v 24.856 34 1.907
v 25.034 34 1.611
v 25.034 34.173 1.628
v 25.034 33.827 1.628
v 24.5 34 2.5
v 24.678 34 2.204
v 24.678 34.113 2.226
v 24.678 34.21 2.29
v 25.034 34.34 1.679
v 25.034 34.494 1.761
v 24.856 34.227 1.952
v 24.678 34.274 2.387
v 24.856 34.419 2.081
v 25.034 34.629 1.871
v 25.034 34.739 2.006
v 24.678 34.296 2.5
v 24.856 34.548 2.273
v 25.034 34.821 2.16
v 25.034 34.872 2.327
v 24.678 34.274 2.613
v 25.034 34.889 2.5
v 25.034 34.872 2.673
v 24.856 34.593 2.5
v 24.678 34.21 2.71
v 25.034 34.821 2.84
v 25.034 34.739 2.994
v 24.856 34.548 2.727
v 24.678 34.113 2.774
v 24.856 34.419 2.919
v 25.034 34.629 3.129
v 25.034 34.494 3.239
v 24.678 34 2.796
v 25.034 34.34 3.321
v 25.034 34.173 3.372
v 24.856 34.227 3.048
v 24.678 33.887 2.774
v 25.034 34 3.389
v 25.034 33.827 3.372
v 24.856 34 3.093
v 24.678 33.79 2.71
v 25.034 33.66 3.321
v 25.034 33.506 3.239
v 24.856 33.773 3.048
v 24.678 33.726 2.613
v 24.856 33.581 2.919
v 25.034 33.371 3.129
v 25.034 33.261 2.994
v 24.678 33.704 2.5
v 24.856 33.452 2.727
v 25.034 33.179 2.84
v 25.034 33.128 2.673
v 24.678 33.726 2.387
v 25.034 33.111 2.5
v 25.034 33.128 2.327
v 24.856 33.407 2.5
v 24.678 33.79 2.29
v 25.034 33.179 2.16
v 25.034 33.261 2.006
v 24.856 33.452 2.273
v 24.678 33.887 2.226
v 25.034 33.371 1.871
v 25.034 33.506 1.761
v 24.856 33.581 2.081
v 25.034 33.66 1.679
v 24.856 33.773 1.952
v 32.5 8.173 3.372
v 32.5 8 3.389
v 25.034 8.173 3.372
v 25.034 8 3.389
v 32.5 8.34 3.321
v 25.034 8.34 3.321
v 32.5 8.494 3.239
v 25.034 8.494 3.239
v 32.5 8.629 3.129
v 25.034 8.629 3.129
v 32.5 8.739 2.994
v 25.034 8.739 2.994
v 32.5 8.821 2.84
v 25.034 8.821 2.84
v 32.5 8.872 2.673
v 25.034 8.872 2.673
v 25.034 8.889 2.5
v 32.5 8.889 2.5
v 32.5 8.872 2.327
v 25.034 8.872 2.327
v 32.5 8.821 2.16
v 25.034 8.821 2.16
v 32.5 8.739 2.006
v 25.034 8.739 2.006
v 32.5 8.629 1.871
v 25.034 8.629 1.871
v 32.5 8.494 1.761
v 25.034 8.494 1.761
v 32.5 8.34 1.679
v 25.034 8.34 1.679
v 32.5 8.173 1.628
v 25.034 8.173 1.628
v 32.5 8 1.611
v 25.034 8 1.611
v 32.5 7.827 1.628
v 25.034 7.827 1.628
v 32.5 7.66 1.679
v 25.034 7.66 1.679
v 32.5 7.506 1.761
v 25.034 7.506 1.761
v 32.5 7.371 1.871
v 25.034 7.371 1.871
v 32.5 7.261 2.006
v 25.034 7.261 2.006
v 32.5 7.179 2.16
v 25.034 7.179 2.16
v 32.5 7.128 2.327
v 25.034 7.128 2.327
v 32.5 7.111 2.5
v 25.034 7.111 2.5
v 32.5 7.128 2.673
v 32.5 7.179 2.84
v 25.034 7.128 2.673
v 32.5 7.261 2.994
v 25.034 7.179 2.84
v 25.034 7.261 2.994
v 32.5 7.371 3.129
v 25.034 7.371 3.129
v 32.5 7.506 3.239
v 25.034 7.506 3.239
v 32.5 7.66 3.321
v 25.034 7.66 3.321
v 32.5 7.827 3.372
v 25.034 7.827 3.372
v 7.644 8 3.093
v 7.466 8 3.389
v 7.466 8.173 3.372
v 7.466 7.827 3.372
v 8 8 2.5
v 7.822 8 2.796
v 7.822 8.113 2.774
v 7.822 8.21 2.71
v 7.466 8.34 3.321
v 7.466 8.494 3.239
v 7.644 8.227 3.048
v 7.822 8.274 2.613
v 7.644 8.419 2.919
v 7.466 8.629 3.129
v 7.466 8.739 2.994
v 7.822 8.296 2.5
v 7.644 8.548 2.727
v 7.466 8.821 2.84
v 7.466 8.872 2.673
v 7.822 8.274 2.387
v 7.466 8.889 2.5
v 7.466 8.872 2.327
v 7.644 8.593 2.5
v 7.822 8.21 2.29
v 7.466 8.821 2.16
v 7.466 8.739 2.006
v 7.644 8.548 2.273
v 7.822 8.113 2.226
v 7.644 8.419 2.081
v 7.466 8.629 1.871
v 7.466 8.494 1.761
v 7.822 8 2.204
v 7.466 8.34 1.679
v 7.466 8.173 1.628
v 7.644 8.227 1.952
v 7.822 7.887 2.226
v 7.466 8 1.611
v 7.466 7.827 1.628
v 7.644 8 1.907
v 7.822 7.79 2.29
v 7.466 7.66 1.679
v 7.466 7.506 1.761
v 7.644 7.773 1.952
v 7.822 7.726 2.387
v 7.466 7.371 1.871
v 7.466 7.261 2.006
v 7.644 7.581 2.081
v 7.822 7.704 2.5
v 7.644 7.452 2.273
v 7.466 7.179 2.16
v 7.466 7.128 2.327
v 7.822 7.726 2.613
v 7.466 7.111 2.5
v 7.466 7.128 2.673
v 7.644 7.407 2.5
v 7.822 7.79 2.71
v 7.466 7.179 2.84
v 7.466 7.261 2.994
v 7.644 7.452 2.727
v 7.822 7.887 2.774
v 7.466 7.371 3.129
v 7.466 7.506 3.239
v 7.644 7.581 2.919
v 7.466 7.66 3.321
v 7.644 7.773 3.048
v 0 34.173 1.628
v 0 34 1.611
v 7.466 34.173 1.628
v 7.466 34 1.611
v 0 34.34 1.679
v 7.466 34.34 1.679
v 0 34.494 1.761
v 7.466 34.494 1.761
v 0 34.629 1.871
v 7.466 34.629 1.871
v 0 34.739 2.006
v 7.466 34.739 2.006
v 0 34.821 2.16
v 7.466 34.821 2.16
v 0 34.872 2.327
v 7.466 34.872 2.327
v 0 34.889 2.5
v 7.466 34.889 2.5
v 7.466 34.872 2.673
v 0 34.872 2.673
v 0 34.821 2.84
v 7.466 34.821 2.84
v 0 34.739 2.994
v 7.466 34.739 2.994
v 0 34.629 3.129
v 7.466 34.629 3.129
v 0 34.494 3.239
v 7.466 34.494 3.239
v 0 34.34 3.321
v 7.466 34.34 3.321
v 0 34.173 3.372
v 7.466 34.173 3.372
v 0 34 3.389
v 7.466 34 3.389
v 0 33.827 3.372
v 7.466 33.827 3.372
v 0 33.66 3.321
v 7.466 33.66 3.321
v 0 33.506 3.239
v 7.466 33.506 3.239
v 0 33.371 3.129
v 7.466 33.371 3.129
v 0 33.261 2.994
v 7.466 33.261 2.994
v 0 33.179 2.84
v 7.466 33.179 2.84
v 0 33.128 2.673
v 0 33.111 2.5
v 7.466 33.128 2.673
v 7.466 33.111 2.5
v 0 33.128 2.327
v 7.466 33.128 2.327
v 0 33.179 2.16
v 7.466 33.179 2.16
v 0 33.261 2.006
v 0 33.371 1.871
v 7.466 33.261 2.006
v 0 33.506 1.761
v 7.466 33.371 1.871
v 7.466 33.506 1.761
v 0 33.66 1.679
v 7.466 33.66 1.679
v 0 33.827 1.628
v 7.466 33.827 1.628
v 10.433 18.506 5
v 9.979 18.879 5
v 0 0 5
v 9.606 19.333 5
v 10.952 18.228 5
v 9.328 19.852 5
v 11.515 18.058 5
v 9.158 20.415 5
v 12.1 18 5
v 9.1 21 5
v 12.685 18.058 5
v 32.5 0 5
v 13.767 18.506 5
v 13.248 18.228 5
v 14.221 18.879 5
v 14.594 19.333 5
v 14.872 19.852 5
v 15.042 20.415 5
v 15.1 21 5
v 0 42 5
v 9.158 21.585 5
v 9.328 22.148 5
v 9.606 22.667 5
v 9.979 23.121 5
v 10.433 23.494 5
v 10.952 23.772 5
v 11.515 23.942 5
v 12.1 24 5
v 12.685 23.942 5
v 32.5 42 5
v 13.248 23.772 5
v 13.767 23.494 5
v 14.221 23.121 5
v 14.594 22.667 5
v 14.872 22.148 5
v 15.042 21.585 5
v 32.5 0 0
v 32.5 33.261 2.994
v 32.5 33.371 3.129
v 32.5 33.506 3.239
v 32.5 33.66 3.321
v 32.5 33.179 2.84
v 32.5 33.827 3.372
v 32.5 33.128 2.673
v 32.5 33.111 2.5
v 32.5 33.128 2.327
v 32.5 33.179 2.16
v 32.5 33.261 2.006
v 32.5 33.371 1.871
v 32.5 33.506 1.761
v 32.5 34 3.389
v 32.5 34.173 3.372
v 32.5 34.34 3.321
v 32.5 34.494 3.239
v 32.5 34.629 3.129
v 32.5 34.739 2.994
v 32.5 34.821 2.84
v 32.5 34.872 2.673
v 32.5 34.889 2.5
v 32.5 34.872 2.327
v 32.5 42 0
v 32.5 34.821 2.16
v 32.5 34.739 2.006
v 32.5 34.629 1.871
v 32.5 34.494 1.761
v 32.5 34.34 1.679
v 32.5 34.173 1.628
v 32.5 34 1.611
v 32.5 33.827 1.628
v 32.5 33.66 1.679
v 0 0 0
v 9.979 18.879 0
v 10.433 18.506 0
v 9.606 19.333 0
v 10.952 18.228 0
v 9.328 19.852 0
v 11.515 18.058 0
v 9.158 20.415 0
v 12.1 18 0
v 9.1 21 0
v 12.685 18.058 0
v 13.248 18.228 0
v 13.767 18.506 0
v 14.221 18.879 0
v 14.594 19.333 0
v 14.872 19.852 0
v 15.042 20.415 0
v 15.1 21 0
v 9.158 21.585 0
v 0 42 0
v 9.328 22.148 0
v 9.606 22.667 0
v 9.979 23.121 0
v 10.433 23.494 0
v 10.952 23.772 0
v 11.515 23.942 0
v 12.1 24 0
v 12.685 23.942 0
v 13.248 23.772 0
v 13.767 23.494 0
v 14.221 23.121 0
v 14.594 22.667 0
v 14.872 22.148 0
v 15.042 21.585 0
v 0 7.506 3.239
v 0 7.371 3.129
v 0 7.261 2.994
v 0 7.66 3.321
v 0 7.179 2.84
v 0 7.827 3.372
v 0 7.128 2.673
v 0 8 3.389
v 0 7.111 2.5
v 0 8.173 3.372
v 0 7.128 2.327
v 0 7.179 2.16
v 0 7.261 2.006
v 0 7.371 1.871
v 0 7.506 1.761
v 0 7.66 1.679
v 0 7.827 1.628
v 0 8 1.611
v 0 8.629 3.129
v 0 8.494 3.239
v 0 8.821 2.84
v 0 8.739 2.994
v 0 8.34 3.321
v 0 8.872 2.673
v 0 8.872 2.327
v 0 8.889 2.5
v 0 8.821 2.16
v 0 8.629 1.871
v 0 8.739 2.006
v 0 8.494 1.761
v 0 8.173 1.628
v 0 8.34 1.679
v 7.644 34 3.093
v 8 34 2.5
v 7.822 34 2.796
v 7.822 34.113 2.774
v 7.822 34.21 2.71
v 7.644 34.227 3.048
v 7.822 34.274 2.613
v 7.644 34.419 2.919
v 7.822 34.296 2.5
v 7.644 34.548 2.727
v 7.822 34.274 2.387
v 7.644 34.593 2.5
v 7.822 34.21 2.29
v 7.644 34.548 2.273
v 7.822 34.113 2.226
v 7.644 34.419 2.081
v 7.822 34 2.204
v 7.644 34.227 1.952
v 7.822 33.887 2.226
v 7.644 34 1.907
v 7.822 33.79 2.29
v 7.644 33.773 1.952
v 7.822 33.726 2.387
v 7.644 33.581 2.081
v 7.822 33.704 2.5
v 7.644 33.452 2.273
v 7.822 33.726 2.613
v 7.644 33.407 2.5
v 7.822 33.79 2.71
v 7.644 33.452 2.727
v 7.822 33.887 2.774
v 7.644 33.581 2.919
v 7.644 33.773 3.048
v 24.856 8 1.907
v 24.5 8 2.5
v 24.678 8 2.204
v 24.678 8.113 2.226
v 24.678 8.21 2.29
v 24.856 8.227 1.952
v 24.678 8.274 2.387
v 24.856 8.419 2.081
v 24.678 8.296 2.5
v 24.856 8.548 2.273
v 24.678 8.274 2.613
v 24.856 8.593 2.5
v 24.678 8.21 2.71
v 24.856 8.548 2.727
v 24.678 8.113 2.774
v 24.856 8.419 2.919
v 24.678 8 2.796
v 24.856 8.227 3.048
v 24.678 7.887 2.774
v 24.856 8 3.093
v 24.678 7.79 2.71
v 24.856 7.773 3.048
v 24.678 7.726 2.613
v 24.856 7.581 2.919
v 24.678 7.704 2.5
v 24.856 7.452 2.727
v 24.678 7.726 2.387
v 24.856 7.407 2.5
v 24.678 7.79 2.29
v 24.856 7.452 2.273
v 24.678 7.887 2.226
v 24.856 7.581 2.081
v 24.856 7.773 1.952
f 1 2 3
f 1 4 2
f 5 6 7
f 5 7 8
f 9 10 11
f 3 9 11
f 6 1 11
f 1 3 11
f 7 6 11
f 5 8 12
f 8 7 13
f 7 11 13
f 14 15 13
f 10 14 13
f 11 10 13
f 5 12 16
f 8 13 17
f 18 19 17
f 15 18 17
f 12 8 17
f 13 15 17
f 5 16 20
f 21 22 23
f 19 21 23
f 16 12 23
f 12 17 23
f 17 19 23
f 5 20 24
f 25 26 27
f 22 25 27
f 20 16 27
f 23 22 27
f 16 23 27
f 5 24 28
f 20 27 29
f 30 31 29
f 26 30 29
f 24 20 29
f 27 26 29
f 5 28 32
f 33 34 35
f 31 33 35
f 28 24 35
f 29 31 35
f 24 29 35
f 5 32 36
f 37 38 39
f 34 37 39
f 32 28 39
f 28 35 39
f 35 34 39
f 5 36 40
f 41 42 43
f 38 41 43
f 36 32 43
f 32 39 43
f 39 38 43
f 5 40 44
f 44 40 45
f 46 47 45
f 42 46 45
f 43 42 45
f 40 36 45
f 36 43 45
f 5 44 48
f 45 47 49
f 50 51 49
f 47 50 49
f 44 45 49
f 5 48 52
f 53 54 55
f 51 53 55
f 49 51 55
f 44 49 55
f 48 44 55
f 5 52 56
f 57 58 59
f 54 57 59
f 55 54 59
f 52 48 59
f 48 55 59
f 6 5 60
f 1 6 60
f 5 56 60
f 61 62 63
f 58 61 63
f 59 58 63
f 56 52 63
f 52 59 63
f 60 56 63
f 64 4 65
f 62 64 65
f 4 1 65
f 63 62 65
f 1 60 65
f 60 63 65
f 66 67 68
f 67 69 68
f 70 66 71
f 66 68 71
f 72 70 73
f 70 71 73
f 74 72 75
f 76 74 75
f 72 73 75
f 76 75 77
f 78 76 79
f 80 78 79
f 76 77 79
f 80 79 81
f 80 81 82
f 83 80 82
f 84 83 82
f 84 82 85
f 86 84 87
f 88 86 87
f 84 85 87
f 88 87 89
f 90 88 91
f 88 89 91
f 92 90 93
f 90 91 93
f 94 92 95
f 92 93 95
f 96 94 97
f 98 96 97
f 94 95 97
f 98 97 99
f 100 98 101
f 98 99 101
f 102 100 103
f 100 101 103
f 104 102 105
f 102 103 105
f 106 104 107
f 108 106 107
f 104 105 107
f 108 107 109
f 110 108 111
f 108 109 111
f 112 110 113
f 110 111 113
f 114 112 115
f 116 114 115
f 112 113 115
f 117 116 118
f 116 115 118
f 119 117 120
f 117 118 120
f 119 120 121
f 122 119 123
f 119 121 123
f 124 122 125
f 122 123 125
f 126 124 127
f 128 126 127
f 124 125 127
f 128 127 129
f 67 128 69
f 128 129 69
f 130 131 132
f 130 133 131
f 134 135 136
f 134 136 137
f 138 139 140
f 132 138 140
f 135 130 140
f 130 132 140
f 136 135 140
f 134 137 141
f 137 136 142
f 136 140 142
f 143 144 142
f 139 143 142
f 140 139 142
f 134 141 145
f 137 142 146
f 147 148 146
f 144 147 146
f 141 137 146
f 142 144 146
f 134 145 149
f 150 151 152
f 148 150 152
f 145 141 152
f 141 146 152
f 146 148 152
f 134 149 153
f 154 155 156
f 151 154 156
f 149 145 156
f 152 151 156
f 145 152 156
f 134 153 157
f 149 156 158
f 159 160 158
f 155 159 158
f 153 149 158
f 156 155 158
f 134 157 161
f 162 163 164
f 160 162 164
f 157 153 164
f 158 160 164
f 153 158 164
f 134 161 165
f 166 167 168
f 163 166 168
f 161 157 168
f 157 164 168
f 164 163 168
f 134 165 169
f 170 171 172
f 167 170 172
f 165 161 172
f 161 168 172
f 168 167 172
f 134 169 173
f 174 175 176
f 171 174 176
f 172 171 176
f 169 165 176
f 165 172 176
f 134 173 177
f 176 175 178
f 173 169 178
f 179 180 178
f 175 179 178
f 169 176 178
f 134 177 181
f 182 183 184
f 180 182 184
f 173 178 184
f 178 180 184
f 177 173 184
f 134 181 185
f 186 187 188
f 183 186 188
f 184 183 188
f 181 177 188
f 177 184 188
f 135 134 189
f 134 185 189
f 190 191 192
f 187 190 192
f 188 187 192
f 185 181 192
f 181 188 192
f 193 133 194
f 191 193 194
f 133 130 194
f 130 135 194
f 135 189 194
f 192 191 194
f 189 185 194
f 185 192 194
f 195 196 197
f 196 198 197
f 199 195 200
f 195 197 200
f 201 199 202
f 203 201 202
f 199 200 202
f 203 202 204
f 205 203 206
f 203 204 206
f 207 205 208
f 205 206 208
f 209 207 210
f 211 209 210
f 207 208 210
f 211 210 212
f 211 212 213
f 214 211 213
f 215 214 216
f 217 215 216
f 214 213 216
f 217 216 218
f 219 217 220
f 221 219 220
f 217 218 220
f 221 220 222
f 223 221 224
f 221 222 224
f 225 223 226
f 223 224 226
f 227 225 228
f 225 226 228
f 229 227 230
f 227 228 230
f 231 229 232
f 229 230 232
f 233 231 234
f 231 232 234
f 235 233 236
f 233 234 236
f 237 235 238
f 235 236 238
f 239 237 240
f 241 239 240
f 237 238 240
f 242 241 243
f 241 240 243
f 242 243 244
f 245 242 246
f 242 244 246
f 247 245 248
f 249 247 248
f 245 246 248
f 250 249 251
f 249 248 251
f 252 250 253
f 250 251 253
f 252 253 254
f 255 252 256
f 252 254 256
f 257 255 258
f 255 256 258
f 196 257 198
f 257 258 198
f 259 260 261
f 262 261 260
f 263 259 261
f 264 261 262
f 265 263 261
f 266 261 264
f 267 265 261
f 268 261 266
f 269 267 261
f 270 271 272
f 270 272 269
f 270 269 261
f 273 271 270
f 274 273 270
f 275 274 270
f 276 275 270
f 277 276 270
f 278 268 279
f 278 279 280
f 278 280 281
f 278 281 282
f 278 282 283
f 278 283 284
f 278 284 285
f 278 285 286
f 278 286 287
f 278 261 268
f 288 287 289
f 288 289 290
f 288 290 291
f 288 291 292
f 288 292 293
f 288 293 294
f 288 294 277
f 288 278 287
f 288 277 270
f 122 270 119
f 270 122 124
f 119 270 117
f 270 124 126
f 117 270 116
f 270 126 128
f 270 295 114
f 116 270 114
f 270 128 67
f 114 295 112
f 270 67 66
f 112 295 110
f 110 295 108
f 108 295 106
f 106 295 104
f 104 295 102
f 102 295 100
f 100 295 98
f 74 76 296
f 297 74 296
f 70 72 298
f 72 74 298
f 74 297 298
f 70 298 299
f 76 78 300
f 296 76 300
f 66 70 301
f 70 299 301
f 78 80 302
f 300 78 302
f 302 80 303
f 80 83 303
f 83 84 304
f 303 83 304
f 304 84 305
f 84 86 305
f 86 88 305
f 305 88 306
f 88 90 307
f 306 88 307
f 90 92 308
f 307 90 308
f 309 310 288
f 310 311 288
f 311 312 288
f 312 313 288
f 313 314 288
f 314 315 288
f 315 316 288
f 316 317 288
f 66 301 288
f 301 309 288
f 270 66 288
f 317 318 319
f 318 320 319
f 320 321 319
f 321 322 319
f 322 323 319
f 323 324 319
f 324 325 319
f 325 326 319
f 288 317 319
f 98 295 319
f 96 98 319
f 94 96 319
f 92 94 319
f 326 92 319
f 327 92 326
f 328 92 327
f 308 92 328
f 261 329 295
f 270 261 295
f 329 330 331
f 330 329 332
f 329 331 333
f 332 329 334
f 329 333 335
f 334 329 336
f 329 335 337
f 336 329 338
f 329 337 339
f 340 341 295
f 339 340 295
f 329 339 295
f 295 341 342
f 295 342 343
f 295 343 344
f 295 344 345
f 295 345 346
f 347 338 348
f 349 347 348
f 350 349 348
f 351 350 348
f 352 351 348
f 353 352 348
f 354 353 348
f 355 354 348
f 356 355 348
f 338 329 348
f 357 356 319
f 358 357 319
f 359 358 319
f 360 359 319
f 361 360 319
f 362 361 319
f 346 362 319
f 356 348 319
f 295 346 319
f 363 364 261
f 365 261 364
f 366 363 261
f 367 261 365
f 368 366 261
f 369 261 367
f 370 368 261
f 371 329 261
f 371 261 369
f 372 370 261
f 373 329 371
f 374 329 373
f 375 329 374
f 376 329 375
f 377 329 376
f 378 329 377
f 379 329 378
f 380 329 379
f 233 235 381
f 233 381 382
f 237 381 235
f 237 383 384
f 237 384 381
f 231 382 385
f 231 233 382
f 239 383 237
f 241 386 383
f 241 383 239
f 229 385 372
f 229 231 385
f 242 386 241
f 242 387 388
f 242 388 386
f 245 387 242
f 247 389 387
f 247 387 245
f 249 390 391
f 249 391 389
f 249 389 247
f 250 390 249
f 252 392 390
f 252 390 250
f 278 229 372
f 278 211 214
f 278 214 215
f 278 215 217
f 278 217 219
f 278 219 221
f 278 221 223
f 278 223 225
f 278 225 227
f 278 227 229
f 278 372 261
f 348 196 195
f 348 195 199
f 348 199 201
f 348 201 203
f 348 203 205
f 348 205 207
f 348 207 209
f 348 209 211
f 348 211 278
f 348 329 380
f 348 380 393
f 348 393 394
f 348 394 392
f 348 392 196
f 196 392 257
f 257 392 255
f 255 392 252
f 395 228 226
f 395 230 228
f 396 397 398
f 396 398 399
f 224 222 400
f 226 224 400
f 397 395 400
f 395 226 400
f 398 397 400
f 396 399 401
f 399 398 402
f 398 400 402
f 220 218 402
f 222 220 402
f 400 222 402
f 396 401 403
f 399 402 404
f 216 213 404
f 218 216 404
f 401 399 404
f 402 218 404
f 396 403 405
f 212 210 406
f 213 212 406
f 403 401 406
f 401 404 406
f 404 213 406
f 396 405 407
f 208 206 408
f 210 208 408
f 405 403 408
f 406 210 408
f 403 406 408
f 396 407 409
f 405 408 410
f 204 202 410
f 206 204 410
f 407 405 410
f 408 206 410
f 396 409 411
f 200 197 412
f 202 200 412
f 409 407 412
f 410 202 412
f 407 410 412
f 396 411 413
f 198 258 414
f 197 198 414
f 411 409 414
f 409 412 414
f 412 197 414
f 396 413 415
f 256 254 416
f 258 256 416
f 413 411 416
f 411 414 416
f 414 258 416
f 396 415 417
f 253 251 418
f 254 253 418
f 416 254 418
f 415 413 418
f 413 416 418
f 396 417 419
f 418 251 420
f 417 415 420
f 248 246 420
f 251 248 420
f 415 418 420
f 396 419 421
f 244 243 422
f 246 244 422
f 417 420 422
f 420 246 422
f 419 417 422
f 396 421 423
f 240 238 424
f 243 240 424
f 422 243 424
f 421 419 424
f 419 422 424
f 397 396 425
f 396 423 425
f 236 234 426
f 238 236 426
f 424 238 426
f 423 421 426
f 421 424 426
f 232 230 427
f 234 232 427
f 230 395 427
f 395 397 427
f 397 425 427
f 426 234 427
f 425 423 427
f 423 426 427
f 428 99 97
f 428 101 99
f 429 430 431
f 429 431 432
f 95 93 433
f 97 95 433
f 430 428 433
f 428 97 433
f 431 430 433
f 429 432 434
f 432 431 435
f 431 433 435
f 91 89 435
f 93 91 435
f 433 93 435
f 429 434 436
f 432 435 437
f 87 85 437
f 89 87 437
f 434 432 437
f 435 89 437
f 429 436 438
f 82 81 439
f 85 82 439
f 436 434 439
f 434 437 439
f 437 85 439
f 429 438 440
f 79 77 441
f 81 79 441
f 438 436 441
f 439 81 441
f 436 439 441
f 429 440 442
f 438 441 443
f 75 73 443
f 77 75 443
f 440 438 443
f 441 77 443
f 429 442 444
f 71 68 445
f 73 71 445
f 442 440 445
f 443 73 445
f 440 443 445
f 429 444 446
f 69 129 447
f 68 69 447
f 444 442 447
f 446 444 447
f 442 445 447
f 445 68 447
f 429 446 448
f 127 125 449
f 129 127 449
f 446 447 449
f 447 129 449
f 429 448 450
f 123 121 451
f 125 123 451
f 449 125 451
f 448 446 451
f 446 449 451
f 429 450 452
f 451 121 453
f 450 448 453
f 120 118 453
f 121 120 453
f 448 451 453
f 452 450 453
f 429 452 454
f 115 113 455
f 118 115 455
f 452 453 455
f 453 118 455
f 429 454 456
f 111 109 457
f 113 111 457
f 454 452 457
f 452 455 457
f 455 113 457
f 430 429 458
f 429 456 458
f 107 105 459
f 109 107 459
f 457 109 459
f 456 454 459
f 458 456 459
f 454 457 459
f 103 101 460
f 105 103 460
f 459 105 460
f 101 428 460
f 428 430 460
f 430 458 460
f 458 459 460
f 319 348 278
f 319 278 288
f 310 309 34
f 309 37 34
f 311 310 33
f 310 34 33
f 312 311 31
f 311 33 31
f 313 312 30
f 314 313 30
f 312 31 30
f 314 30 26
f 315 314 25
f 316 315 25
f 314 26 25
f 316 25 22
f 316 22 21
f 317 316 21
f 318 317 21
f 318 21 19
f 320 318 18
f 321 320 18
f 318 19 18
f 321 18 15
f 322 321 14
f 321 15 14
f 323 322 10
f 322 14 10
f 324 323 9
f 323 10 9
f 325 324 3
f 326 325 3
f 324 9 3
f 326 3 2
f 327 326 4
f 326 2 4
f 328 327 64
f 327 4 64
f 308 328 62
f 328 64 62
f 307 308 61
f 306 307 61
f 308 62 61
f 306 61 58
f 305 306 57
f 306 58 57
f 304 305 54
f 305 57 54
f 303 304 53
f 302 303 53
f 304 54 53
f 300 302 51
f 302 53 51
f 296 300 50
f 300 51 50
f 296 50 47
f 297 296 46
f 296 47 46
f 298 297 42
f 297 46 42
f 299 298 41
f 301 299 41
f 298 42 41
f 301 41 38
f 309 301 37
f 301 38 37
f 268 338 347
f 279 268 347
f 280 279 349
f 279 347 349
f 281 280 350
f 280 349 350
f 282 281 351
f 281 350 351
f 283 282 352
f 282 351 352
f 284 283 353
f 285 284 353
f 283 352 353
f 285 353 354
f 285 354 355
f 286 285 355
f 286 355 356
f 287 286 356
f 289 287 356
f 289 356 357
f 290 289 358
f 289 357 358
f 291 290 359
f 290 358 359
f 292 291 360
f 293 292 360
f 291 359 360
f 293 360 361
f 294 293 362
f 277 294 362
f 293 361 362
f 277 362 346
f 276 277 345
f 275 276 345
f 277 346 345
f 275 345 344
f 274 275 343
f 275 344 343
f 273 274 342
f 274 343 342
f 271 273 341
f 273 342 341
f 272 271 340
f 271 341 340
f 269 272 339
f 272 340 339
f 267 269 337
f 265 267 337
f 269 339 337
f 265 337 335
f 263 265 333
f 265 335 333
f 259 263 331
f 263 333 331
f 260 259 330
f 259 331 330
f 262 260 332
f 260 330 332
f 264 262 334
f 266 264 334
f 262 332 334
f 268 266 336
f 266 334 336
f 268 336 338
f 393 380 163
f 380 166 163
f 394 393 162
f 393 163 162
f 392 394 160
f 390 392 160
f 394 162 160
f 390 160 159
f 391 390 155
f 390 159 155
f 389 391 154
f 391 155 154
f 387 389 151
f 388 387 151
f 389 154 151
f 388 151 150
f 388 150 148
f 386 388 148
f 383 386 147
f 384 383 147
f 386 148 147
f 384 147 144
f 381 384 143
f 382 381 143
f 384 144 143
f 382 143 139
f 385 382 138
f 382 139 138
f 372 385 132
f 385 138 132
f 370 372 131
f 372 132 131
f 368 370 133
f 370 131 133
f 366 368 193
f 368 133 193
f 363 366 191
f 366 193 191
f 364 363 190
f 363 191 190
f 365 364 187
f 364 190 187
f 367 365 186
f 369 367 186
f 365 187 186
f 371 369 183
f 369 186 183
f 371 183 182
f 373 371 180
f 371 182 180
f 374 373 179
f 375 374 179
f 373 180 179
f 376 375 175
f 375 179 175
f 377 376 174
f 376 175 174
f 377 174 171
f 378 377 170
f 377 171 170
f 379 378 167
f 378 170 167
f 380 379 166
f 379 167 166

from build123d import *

# Parameters (mm, degrees)
SKETCH1_W                 = 32.5
SKETCH1_H                 = 42
BOSS_EXTRUDE2_DEPTH       = 5
F_2_56_TAPPED_HOLE1_D     = 1.778
F_2_56_TAPPED_HOLE1_DEPTH = 7.46583491
F_2_56_TAPPED_HOLE1_TIP   = 0.53416509
F_2_56_TAPPED_HOLE2_D     = 1.778
F_2_56_TAPPED_HOLE2_DEPTH = 7.46583491
F_2_56_TAPPED_HOLE2_TIP   = 0.53416509
CUT_EXTRUDE1_DEPTH        = 5


with BuildPart() as part:
    # Sketch1 → Boss-Extrude2 (new body)
    with BuildSketch(Plane.XY):
        with Locations((16.25, 21)):
            Rectangle(SKETCH1_W, SKETCH1_H)
    extrude(amount=BOSS_EXTRUDE2_DEPTH)

    # #2-56 Tapped Hole1
    with Locations(Plane.ZY):
        with Locations((2.5, 34), (2.5, 8)):
            Hole(F_2_56_TAPPED_HOLE1_D / 2, depth=F_2_56_TAPPED_HOLE1_DEPTH)
            with Locations((0, 0, -(F_2_56_TAPPED_HOLE1_DEPTH + F_2_56_TAPPED_HOLE1_TIP / 2))):  # 118° drill point
                Cone(0, F_2_56_TAPPED_HOLE1_D / 2, F_2_56_TAPPED_HOLE1_TIP, mode=Mode.SUBTRACT)

    # #2-56 Tapped Hole2
    with Locations(Plane(origin=(32.5, 0, 0), x_dir=(0, 0, -1), z_dir=(1, 0, 0))):
        with Locations((-2.5, 34), (-2.5, 8)):
            Hole(F_2_56_TAPPED_HOLE2_D / 2, depth=F_2_56_TAPPED_HOLE2_DEPTH)
            with Locations((0, 0, -(F_2_56_TAPPED_HOLE2_DEPTH + F_2_56_TAPPED_HOLE2_TIP / 2))):  # 118° drill point
                Cone(0, F_2_56_TAPPED_HOLE2_D / 2, F_2_56_TAPPED_HOLE2_TIP, mode=Mode.SUBTRACT)

    # Sketch9 → Cut-Extrude1 (cut)
    with BuildSketch(Plane(origin=(0, 0, 0), x_dir=(-1, 0, 0), z_dir=(0, 0, -1))):
        with BuildLine():
            ThreePointArc((-15.1, 21), (-12.1, 18), (-9.1, 21))
            Line((-9.1, 21), (-12.1, 21))
            Line((-12.1, 21), (-15.1, 21))
        make_face()
        with BuildLine():
            Line((-12.1, 21), (-9.1, 21))
            ThreePointArc((-9.1, 21), (-12.1, 24), (-15.1, 21))
            Line((-15.1, 21), (-12.1, 21))
        make_face()
    extrude(amount=-CUT_EXTRUDE1_DEPTH, mode=Mode.SUBTRACT)


solid = part.part
